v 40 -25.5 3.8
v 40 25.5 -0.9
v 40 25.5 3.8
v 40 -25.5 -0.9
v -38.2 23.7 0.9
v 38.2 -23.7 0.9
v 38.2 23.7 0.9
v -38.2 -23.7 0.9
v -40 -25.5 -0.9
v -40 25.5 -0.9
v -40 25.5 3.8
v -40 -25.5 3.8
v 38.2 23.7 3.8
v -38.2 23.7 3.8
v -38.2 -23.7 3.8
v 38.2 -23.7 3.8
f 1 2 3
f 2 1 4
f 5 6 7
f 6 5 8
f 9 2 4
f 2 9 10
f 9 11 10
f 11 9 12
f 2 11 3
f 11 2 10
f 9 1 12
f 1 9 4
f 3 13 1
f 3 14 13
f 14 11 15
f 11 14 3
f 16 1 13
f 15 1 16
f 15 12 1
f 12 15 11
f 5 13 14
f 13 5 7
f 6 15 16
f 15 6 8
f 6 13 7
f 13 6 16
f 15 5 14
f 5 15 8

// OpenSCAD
/**
 * Glass Inner bottom (Ikea glass)
 * @Author Wilfried Loche
 * @Created Jan 27, 2017
 */

/* Plater size */
width = 80;
depth = 51;
thickness = 1.8;
borderHeight = 4;



cube(size=[width, depth, thickness], center=true);

translate([0, (depth-thickness)/2, thickness])
    cube(size=[width, thickness, borderHeight], center=true);
translate([0, -(depth-thickness)/2, thickness])
    cube(size=[width, thickness, borderHeight], center=true);

translate([(width-thickness)/2, 0, thickness])
    cube(size=[thickness, depth, borderHeight], center=true);
translate([-(width-thickness)/2, 0, thickness])
    cube(size=[thickness, depth, borderHeight], center=true);
